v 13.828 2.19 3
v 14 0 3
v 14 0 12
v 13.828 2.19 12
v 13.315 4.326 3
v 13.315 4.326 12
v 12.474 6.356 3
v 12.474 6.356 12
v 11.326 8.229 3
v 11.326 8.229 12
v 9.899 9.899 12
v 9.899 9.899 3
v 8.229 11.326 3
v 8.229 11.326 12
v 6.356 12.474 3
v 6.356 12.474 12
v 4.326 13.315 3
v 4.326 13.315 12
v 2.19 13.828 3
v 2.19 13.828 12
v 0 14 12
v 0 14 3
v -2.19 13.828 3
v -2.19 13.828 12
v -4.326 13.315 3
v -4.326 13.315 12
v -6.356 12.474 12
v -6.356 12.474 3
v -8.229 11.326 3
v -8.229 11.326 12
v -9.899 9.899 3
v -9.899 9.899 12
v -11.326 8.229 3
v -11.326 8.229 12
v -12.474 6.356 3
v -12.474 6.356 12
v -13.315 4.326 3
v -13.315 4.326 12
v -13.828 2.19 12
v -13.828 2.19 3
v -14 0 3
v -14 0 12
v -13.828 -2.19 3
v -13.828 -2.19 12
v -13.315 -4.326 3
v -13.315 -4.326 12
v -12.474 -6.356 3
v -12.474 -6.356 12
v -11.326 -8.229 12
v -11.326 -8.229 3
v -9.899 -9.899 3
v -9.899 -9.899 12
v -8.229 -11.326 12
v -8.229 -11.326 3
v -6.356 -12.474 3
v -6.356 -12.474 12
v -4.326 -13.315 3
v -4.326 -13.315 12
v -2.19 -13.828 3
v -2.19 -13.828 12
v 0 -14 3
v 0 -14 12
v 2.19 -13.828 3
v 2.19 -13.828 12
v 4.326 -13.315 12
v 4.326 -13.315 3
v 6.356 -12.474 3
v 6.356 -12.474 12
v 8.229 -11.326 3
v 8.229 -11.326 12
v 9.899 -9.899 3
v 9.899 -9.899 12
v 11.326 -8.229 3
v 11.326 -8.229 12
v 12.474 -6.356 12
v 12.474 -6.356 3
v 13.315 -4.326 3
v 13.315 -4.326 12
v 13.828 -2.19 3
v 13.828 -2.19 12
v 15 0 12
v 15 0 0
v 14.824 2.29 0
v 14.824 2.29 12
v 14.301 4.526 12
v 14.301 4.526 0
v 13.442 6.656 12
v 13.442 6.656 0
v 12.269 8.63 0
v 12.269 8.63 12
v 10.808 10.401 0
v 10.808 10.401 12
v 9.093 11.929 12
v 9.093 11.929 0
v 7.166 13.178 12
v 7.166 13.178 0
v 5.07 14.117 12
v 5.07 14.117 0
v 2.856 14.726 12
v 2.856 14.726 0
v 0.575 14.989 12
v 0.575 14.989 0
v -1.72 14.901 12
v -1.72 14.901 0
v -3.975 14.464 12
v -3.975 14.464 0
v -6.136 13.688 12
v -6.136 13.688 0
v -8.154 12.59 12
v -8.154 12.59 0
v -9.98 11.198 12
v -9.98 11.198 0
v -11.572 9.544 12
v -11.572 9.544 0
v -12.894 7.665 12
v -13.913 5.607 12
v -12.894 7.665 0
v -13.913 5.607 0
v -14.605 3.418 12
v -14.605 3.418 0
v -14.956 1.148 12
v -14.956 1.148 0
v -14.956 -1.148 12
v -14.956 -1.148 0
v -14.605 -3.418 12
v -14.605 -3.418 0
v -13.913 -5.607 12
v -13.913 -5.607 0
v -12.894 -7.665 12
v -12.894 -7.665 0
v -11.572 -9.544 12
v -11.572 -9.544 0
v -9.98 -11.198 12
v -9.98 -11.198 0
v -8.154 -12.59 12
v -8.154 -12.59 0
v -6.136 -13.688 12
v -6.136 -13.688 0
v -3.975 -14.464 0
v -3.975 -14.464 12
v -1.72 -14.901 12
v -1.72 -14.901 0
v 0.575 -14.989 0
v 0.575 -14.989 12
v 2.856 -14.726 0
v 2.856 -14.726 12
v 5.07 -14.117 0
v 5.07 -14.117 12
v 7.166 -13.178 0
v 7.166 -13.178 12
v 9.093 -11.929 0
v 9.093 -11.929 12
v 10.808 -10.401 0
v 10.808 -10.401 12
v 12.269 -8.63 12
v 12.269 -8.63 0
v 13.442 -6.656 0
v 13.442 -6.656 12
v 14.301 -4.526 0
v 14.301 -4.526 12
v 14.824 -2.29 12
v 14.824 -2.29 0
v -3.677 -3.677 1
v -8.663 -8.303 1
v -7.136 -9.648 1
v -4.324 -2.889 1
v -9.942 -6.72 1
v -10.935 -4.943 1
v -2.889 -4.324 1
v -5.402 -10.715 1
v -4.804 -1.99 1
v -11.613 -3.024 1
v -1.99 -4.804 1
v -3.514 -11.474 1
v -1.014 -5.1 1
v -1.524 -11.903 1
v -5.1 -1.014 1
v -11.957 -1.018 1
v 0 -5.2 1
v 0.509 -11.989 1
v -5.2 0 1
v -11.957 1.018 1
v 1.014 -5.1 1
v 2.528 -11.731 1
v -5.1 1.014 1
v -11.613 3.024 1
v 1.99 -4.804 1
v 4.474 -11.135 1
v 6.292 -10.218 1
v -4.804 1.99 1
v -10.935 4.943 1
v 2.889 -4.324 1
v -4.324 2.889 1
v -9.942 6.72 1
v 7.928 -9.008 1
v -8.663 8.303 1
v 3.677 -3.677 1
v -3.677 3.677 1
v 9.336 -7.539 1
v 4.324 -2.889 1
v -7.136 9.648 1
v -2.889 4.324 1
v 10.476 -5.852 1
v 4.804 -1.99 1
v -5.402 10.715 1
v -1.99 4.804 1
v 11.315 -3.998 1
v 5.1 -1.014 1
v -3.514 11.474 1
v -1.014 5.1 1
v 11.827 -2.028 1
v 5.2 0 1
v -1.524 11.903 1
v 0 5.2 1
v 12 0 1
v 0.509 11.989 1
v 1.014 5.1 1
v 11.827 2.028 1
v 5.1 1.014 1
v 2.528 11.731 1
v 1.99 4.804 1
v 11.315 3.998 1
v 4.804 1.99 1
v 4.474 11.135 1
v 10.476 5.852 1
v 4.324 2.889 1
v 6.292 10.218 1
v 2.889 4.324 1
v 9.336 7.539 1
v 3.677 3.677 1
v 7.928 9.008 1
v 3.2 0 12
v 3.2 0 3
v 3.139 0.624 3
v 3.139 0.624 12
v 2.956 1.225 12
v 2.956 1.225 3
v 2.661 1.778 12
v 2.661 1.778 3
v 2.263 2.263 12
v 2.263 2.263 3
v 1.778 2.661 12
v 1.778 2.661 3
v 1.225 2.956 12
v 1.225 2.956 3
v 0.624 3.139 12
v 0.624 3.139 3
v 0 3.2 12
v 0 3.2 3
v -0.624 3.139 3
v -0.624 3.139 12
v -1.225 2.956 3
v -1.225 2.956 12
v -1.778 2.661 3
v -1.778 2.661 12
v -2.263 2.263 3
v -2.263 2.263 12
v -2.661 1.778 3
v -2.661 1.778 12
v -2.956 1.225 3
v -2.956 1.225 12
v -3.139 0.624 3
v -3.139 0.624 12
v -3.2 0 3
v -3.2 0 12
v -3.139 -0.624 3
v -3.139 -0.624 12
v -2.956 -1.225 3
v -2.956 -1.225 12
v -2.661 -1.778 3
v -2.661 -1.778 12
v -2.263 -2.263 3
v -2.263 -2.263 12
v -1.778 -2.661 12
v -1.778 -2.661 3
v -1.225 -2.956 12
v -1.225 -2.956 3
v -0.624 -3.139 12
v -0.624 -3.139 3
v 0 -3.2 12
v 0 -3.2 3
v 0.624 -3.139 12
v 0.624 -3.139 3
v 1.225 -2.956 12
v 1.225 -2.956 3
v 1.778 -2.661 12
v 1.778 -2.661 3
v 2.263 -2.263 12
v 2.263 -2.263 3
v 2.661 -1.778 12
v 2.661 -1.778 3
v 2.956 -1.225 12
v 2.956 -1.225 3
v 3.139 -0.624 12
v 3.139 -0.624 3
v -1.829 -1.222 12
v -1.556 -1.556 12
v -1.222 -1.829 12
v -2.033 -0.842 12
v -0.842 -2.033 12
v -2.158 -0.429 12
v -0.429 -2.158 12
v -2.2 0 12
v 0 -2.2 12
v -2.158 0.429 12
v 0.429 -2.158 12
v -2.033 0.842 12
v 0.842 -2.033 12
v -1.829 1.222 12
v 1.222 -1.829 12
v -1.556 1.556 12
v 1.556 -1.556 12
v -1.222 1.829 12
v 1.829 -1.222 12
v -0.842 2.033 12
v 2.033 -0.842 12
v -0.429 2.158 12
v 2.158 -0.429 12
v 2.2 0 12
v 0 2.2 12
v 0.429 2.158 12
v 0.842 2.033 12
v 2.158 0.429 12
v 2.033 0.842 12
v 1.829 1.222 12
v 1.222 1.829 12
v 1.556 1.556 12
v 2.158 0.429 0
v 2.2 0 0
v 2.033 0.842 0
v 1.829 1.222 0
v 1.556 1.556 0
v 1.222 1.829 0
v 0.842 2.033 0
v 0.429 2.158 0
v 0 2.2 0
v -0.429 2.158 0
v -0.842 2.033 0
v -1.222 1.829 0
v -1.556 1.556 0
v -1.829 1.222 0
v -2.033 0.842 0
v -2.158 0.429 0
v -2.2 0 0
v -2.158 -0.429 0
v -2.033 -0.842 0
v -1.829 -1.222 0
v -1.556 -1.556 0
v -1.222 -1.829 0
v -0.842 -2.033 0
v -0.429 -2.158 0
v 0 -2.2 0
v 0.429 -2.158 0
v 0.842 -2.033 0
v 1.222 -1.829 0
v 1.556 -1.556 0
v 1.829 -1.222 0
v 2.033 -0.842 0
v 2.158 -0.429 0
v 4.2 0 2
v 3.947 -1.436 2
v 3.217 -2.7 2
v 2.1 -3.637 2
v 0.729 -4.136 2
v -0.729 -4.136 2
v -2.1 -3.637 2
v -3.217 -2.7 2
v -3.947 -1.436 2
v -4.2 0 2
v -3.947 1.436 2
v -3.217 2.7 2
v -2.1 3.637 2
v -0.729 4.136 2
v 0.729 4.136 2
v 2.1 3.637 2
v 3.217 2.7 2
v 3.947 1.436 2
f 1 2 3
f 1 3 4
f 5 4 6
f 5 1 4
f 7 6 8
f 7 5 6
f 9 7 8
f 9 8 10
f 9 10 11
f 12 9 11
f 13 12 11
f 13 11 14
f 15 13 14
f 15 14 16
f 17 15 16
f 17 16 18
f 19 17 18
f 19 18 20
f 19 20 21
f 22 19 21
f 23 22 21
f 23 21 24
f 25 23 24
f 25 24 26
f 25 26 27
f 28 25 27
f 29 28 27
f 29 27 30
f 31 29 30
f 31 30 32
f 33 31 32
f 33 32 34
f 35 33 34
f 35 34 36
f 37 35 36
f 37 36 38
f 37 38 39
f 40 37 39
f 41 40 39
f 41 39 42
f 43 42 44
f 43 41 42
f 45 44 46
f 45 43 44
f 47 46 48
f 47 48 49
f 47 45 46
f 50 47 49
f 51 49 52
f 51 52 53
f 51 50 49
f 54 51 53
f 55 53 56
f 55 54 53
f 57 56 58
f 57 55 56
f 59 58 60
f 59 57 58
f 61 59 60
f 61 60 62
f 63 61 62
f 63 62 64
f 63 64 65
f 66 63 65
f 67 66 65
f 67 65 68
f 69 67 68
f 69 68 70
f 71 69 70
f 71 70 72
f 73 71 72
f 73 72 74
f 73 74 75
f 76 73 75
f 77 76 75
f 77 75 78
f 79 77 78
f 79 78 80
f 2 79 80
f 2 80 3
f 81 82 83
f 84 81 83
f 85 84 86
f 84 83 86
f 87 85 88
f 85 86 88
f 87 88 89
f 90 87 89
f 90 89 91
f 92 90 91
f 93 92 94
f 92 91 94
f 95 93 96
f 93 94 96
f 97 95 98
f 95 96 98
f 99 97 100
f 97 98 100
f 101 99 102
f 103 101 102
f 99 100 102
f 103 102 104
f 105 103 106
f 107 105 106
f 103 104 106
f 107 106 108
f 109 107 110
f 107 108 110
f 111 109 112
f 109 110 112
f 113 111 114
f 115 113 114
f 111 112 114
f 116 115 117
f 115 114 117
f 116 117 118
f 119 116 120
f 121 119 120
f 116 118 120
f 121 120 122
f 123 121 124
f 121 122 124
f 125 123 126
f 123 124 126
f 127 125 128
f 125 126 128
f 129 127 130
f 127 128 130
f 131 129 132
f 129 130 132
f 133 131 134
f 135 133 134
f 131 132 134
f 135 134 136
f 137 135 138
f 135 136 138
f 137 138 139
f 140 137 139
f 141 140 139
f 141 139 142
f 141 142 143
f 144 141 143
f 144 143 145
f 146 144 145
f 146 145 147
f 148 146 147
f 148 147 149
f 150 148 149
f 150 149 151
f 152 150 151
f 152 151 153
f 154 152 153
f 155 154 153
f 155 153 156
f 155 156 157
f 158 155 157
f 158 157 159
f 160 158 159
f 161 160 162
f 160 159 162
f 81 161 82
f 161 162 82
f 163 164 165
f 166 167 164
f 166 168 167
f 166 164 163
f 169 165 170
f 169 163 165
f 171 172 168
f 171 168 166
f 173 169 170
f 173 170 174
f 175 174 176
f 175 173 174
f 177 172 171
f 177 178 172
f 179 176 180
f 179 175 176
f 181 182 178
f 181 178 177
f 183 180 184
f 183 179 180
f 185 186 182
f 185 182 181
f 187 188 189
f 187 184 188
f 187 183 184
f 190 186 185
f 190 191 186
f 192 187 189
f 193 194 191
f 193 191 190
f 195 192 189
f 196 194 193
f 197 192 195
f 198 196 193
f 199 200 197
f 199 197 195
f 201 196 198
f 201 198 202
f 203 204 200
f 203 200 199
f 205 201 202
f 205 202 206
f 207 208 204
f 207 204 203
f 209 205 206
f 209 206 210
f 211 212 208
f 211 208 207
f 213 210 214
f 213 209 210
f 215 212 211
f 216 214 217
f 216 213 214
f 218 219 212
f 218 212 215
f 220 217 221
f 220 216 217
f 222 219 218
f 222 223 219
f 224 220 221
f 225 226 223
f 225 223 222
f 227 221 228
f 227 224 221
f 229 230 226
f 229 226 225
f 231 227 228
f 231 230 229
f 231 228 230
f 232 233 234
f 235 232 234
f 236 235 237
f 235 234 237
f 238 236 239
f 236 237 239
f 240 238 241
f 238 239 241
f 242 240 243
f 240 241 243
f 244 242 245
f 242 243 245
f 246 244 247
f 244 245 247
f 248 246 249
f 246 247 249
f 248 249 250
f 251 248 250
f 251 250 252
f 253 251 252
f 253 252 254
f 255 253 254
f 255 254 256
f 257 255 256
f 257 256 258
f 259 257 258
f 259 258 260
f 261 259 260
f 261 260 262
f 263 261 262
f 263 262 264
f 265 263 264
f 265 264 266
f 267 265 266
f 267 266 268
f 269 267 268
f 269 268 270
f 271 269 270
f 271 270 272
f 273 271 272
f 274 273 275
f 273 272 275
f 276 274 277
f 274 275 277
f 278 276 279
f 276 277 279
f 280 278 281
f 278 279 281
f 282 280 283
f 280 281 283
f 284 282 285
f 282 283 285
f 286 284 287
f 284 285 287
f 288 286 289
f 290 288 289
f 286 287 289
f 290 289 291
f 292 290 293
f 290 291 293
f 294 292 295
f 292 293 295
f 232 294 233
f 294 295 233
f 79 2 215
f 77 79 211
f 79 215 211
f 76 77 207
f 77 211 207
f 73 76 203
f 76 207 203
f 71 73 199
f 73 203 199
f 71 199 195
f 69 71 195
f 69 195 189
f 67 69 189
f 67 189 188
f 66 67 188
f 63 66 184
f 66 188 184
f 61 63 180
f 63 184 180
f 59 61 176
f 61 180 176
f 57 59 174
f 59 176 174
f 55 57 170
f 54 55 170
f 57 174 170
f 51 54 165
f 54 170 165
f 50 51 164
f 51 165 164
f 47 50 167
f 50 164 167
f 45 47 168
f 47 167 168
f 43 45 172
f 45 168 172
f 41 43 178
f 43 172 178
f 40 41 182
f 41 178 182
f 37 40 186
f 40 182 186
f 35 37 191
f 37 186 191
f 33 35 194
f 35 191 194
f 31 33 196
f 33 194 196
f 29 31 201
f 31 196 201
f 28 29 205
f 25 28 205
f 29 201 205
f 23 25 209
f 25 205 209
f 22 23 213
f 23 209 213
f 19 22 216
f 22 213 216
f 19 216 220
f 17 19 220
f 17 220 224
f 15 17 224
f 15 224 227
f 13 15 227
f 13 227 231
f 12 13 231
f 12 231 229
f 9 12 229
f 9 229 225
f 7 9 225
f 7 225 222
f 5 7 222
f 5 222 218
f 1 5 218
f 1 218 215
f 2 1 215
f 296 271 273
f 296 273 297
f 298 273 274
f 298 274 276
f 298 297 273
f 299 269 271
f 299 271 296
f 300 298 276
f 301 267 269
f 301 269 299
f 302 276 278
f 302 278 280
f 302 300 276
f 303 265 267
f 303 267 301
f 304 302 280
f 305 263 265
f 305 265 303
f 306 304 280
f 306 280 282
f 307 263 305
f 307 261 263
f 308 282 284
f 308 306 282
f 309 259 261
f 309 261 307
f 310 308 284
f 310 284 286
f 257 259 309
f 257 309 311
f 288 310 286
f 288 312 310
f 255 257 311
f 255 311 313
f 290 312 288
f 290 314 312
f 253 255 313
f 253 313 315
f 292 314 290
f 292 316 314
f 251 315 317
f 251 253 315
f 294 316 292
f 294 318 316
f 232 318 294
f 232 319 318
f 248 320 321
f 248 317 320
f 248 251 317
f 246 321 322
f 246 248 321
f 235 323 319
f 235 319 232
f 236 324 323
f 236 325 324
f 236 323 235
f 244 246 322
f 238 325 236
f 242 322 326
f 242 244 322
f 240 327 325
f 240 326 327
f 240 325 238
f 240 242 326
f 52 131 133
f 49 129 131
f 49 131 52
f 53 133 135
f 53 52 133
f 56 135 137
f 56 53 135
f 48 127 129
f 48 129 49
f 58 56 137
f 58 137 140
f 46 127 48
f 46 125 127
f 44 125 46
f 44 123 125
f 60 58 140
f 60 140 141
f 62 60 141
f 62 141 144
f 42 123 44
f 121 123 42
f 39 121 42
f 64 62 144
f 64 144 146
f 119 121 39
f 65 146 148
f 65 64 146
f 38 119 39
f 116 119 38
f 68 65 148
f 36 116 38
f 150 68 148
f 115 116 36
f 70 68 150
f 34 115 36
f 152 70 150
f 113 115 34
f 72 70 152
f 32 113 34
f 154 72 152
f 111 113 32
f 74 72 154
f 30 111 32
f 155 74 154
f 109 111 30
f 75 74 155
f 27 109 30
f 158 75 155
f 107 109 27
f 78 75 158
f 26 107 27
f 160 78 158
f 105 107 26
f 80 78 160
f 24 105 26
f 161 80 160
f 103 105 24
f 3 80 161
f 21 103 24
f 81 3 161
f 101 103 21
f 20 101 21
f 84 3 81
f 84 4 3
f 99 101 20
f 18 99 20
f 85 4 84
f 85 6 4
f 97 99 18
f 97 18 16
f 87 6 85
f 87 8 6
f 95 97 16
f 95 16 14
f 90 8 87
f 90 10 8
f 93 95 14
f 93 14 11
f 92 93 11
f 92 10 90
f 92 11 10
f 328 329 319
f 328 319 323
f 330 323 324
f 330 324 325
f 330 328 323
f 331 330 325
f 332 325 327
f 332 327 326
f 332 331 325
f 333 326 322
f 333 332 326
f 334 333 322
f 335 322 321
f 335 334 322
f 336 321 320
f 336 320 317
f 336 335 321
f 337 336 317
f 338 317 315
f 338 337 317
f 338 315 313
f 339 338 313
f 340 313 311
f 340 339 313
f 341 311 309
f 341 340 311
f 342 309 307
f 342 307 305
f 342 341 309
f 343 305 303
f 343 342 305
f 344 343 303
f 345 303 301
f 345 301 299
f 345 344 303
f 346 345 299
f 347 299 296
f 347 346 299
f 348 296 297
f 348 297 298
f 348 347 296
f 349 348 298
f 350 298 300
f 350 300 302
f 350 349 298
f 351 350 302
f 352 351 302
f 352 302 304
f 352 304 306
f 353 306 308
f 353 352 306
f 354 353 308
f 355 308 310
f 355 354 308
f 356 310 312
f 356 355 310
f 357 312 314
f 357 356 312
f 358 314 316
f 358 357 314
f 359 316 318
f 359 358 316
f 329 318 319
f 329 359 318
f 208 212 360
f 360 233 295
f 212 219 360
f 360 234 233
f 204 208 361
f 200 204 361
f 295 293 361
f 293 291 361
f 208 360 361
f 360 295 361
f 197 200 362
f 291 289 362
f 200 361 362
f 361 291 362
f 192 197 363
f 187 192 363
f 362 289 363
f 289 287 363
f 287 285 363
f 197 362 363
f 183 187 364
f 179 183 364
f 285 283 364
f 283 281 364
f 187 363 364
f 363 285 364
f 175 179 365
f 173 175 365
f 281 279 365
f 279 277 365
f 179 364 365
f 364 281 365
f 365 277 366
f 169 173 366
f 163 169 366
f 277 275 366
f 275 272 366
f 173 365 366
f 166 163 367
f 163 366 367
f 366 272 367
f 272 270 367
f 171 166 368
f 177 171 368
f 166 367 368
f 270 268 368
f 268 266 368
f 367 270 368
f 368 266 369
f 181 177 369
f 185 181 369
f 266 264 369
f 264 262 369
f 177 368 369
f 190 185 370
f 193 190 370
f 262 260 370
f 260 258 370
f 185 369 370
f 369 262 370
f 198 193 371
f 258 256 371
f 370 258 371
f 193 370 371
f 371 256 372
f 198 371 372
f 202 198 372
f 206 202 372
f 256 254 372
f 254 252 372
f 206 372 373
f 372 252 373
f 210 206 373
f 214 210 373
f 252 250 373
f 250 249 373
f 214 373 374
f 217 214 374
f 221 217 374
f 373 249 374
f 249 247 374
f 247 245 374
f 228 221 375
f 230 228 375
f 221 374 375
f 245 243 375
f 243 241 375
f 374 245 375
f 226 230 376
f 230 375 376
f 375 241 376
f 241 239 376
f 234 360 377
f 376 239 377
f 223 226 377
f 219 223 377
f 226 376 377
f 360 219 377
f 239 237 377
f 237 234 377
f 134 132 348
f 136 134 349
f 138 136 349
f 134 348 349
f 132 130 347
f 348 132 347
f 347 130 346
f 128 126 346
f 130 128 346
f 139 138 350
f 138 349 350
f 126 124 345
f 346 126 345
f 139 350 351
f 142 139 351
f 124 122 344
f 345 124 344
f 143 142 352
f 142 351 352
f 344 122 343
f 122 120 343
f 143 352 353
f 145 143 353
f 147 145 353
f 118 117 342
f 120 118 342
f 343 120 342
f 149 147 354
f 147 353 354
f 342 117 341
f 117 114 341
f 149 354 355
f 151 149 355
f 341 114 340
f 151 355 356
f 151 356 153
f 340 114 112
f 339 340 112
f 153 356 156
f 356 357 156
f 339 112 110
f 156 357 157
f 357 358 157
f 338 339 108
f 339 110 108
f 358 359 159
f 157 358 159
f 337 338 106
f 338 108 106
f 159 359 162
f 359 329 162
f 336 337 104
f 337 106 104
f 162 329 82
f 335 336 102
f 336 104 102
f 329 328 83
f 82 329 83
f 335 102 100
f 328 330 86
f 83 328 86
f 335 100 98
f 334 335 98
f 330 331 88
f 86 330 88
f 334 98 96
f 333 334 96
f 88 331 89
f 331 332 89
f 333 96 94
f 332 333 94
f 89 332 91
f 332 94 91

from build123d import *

# Parameters (mm, degrees)
F0_R     = 15
F0_R_2   = 2.2
F1_DEPTH = 12
F2_T     = -1
F3_SIZE  = 2


with BuildPart() as f1:
    # F0 (on Top) → F1 (new body)
    with BuildSketch(Plane.XY):
        Circle(F0_R)
        Circle(F0_R_2, mode=Mode.SUBTRACT)
    extrude(amount=F1_DEPTH)

    # F2
    f2_openings = [f1.faces().sort_by_distance(p)[0] for p in [
        (-14.575736, 0, 12),
    ]]
    offset(amount=F2_T, openings=f2_openings)

    # F3
    f3_edges = [f1.edges().sort_by_distance(p)[0] for p in [
        (-14, 0, 1),
        (-3.2, 0, 1),
    ]]
    chamfer(f3_edges, length=F3_SIZE)


solid = f1.part
